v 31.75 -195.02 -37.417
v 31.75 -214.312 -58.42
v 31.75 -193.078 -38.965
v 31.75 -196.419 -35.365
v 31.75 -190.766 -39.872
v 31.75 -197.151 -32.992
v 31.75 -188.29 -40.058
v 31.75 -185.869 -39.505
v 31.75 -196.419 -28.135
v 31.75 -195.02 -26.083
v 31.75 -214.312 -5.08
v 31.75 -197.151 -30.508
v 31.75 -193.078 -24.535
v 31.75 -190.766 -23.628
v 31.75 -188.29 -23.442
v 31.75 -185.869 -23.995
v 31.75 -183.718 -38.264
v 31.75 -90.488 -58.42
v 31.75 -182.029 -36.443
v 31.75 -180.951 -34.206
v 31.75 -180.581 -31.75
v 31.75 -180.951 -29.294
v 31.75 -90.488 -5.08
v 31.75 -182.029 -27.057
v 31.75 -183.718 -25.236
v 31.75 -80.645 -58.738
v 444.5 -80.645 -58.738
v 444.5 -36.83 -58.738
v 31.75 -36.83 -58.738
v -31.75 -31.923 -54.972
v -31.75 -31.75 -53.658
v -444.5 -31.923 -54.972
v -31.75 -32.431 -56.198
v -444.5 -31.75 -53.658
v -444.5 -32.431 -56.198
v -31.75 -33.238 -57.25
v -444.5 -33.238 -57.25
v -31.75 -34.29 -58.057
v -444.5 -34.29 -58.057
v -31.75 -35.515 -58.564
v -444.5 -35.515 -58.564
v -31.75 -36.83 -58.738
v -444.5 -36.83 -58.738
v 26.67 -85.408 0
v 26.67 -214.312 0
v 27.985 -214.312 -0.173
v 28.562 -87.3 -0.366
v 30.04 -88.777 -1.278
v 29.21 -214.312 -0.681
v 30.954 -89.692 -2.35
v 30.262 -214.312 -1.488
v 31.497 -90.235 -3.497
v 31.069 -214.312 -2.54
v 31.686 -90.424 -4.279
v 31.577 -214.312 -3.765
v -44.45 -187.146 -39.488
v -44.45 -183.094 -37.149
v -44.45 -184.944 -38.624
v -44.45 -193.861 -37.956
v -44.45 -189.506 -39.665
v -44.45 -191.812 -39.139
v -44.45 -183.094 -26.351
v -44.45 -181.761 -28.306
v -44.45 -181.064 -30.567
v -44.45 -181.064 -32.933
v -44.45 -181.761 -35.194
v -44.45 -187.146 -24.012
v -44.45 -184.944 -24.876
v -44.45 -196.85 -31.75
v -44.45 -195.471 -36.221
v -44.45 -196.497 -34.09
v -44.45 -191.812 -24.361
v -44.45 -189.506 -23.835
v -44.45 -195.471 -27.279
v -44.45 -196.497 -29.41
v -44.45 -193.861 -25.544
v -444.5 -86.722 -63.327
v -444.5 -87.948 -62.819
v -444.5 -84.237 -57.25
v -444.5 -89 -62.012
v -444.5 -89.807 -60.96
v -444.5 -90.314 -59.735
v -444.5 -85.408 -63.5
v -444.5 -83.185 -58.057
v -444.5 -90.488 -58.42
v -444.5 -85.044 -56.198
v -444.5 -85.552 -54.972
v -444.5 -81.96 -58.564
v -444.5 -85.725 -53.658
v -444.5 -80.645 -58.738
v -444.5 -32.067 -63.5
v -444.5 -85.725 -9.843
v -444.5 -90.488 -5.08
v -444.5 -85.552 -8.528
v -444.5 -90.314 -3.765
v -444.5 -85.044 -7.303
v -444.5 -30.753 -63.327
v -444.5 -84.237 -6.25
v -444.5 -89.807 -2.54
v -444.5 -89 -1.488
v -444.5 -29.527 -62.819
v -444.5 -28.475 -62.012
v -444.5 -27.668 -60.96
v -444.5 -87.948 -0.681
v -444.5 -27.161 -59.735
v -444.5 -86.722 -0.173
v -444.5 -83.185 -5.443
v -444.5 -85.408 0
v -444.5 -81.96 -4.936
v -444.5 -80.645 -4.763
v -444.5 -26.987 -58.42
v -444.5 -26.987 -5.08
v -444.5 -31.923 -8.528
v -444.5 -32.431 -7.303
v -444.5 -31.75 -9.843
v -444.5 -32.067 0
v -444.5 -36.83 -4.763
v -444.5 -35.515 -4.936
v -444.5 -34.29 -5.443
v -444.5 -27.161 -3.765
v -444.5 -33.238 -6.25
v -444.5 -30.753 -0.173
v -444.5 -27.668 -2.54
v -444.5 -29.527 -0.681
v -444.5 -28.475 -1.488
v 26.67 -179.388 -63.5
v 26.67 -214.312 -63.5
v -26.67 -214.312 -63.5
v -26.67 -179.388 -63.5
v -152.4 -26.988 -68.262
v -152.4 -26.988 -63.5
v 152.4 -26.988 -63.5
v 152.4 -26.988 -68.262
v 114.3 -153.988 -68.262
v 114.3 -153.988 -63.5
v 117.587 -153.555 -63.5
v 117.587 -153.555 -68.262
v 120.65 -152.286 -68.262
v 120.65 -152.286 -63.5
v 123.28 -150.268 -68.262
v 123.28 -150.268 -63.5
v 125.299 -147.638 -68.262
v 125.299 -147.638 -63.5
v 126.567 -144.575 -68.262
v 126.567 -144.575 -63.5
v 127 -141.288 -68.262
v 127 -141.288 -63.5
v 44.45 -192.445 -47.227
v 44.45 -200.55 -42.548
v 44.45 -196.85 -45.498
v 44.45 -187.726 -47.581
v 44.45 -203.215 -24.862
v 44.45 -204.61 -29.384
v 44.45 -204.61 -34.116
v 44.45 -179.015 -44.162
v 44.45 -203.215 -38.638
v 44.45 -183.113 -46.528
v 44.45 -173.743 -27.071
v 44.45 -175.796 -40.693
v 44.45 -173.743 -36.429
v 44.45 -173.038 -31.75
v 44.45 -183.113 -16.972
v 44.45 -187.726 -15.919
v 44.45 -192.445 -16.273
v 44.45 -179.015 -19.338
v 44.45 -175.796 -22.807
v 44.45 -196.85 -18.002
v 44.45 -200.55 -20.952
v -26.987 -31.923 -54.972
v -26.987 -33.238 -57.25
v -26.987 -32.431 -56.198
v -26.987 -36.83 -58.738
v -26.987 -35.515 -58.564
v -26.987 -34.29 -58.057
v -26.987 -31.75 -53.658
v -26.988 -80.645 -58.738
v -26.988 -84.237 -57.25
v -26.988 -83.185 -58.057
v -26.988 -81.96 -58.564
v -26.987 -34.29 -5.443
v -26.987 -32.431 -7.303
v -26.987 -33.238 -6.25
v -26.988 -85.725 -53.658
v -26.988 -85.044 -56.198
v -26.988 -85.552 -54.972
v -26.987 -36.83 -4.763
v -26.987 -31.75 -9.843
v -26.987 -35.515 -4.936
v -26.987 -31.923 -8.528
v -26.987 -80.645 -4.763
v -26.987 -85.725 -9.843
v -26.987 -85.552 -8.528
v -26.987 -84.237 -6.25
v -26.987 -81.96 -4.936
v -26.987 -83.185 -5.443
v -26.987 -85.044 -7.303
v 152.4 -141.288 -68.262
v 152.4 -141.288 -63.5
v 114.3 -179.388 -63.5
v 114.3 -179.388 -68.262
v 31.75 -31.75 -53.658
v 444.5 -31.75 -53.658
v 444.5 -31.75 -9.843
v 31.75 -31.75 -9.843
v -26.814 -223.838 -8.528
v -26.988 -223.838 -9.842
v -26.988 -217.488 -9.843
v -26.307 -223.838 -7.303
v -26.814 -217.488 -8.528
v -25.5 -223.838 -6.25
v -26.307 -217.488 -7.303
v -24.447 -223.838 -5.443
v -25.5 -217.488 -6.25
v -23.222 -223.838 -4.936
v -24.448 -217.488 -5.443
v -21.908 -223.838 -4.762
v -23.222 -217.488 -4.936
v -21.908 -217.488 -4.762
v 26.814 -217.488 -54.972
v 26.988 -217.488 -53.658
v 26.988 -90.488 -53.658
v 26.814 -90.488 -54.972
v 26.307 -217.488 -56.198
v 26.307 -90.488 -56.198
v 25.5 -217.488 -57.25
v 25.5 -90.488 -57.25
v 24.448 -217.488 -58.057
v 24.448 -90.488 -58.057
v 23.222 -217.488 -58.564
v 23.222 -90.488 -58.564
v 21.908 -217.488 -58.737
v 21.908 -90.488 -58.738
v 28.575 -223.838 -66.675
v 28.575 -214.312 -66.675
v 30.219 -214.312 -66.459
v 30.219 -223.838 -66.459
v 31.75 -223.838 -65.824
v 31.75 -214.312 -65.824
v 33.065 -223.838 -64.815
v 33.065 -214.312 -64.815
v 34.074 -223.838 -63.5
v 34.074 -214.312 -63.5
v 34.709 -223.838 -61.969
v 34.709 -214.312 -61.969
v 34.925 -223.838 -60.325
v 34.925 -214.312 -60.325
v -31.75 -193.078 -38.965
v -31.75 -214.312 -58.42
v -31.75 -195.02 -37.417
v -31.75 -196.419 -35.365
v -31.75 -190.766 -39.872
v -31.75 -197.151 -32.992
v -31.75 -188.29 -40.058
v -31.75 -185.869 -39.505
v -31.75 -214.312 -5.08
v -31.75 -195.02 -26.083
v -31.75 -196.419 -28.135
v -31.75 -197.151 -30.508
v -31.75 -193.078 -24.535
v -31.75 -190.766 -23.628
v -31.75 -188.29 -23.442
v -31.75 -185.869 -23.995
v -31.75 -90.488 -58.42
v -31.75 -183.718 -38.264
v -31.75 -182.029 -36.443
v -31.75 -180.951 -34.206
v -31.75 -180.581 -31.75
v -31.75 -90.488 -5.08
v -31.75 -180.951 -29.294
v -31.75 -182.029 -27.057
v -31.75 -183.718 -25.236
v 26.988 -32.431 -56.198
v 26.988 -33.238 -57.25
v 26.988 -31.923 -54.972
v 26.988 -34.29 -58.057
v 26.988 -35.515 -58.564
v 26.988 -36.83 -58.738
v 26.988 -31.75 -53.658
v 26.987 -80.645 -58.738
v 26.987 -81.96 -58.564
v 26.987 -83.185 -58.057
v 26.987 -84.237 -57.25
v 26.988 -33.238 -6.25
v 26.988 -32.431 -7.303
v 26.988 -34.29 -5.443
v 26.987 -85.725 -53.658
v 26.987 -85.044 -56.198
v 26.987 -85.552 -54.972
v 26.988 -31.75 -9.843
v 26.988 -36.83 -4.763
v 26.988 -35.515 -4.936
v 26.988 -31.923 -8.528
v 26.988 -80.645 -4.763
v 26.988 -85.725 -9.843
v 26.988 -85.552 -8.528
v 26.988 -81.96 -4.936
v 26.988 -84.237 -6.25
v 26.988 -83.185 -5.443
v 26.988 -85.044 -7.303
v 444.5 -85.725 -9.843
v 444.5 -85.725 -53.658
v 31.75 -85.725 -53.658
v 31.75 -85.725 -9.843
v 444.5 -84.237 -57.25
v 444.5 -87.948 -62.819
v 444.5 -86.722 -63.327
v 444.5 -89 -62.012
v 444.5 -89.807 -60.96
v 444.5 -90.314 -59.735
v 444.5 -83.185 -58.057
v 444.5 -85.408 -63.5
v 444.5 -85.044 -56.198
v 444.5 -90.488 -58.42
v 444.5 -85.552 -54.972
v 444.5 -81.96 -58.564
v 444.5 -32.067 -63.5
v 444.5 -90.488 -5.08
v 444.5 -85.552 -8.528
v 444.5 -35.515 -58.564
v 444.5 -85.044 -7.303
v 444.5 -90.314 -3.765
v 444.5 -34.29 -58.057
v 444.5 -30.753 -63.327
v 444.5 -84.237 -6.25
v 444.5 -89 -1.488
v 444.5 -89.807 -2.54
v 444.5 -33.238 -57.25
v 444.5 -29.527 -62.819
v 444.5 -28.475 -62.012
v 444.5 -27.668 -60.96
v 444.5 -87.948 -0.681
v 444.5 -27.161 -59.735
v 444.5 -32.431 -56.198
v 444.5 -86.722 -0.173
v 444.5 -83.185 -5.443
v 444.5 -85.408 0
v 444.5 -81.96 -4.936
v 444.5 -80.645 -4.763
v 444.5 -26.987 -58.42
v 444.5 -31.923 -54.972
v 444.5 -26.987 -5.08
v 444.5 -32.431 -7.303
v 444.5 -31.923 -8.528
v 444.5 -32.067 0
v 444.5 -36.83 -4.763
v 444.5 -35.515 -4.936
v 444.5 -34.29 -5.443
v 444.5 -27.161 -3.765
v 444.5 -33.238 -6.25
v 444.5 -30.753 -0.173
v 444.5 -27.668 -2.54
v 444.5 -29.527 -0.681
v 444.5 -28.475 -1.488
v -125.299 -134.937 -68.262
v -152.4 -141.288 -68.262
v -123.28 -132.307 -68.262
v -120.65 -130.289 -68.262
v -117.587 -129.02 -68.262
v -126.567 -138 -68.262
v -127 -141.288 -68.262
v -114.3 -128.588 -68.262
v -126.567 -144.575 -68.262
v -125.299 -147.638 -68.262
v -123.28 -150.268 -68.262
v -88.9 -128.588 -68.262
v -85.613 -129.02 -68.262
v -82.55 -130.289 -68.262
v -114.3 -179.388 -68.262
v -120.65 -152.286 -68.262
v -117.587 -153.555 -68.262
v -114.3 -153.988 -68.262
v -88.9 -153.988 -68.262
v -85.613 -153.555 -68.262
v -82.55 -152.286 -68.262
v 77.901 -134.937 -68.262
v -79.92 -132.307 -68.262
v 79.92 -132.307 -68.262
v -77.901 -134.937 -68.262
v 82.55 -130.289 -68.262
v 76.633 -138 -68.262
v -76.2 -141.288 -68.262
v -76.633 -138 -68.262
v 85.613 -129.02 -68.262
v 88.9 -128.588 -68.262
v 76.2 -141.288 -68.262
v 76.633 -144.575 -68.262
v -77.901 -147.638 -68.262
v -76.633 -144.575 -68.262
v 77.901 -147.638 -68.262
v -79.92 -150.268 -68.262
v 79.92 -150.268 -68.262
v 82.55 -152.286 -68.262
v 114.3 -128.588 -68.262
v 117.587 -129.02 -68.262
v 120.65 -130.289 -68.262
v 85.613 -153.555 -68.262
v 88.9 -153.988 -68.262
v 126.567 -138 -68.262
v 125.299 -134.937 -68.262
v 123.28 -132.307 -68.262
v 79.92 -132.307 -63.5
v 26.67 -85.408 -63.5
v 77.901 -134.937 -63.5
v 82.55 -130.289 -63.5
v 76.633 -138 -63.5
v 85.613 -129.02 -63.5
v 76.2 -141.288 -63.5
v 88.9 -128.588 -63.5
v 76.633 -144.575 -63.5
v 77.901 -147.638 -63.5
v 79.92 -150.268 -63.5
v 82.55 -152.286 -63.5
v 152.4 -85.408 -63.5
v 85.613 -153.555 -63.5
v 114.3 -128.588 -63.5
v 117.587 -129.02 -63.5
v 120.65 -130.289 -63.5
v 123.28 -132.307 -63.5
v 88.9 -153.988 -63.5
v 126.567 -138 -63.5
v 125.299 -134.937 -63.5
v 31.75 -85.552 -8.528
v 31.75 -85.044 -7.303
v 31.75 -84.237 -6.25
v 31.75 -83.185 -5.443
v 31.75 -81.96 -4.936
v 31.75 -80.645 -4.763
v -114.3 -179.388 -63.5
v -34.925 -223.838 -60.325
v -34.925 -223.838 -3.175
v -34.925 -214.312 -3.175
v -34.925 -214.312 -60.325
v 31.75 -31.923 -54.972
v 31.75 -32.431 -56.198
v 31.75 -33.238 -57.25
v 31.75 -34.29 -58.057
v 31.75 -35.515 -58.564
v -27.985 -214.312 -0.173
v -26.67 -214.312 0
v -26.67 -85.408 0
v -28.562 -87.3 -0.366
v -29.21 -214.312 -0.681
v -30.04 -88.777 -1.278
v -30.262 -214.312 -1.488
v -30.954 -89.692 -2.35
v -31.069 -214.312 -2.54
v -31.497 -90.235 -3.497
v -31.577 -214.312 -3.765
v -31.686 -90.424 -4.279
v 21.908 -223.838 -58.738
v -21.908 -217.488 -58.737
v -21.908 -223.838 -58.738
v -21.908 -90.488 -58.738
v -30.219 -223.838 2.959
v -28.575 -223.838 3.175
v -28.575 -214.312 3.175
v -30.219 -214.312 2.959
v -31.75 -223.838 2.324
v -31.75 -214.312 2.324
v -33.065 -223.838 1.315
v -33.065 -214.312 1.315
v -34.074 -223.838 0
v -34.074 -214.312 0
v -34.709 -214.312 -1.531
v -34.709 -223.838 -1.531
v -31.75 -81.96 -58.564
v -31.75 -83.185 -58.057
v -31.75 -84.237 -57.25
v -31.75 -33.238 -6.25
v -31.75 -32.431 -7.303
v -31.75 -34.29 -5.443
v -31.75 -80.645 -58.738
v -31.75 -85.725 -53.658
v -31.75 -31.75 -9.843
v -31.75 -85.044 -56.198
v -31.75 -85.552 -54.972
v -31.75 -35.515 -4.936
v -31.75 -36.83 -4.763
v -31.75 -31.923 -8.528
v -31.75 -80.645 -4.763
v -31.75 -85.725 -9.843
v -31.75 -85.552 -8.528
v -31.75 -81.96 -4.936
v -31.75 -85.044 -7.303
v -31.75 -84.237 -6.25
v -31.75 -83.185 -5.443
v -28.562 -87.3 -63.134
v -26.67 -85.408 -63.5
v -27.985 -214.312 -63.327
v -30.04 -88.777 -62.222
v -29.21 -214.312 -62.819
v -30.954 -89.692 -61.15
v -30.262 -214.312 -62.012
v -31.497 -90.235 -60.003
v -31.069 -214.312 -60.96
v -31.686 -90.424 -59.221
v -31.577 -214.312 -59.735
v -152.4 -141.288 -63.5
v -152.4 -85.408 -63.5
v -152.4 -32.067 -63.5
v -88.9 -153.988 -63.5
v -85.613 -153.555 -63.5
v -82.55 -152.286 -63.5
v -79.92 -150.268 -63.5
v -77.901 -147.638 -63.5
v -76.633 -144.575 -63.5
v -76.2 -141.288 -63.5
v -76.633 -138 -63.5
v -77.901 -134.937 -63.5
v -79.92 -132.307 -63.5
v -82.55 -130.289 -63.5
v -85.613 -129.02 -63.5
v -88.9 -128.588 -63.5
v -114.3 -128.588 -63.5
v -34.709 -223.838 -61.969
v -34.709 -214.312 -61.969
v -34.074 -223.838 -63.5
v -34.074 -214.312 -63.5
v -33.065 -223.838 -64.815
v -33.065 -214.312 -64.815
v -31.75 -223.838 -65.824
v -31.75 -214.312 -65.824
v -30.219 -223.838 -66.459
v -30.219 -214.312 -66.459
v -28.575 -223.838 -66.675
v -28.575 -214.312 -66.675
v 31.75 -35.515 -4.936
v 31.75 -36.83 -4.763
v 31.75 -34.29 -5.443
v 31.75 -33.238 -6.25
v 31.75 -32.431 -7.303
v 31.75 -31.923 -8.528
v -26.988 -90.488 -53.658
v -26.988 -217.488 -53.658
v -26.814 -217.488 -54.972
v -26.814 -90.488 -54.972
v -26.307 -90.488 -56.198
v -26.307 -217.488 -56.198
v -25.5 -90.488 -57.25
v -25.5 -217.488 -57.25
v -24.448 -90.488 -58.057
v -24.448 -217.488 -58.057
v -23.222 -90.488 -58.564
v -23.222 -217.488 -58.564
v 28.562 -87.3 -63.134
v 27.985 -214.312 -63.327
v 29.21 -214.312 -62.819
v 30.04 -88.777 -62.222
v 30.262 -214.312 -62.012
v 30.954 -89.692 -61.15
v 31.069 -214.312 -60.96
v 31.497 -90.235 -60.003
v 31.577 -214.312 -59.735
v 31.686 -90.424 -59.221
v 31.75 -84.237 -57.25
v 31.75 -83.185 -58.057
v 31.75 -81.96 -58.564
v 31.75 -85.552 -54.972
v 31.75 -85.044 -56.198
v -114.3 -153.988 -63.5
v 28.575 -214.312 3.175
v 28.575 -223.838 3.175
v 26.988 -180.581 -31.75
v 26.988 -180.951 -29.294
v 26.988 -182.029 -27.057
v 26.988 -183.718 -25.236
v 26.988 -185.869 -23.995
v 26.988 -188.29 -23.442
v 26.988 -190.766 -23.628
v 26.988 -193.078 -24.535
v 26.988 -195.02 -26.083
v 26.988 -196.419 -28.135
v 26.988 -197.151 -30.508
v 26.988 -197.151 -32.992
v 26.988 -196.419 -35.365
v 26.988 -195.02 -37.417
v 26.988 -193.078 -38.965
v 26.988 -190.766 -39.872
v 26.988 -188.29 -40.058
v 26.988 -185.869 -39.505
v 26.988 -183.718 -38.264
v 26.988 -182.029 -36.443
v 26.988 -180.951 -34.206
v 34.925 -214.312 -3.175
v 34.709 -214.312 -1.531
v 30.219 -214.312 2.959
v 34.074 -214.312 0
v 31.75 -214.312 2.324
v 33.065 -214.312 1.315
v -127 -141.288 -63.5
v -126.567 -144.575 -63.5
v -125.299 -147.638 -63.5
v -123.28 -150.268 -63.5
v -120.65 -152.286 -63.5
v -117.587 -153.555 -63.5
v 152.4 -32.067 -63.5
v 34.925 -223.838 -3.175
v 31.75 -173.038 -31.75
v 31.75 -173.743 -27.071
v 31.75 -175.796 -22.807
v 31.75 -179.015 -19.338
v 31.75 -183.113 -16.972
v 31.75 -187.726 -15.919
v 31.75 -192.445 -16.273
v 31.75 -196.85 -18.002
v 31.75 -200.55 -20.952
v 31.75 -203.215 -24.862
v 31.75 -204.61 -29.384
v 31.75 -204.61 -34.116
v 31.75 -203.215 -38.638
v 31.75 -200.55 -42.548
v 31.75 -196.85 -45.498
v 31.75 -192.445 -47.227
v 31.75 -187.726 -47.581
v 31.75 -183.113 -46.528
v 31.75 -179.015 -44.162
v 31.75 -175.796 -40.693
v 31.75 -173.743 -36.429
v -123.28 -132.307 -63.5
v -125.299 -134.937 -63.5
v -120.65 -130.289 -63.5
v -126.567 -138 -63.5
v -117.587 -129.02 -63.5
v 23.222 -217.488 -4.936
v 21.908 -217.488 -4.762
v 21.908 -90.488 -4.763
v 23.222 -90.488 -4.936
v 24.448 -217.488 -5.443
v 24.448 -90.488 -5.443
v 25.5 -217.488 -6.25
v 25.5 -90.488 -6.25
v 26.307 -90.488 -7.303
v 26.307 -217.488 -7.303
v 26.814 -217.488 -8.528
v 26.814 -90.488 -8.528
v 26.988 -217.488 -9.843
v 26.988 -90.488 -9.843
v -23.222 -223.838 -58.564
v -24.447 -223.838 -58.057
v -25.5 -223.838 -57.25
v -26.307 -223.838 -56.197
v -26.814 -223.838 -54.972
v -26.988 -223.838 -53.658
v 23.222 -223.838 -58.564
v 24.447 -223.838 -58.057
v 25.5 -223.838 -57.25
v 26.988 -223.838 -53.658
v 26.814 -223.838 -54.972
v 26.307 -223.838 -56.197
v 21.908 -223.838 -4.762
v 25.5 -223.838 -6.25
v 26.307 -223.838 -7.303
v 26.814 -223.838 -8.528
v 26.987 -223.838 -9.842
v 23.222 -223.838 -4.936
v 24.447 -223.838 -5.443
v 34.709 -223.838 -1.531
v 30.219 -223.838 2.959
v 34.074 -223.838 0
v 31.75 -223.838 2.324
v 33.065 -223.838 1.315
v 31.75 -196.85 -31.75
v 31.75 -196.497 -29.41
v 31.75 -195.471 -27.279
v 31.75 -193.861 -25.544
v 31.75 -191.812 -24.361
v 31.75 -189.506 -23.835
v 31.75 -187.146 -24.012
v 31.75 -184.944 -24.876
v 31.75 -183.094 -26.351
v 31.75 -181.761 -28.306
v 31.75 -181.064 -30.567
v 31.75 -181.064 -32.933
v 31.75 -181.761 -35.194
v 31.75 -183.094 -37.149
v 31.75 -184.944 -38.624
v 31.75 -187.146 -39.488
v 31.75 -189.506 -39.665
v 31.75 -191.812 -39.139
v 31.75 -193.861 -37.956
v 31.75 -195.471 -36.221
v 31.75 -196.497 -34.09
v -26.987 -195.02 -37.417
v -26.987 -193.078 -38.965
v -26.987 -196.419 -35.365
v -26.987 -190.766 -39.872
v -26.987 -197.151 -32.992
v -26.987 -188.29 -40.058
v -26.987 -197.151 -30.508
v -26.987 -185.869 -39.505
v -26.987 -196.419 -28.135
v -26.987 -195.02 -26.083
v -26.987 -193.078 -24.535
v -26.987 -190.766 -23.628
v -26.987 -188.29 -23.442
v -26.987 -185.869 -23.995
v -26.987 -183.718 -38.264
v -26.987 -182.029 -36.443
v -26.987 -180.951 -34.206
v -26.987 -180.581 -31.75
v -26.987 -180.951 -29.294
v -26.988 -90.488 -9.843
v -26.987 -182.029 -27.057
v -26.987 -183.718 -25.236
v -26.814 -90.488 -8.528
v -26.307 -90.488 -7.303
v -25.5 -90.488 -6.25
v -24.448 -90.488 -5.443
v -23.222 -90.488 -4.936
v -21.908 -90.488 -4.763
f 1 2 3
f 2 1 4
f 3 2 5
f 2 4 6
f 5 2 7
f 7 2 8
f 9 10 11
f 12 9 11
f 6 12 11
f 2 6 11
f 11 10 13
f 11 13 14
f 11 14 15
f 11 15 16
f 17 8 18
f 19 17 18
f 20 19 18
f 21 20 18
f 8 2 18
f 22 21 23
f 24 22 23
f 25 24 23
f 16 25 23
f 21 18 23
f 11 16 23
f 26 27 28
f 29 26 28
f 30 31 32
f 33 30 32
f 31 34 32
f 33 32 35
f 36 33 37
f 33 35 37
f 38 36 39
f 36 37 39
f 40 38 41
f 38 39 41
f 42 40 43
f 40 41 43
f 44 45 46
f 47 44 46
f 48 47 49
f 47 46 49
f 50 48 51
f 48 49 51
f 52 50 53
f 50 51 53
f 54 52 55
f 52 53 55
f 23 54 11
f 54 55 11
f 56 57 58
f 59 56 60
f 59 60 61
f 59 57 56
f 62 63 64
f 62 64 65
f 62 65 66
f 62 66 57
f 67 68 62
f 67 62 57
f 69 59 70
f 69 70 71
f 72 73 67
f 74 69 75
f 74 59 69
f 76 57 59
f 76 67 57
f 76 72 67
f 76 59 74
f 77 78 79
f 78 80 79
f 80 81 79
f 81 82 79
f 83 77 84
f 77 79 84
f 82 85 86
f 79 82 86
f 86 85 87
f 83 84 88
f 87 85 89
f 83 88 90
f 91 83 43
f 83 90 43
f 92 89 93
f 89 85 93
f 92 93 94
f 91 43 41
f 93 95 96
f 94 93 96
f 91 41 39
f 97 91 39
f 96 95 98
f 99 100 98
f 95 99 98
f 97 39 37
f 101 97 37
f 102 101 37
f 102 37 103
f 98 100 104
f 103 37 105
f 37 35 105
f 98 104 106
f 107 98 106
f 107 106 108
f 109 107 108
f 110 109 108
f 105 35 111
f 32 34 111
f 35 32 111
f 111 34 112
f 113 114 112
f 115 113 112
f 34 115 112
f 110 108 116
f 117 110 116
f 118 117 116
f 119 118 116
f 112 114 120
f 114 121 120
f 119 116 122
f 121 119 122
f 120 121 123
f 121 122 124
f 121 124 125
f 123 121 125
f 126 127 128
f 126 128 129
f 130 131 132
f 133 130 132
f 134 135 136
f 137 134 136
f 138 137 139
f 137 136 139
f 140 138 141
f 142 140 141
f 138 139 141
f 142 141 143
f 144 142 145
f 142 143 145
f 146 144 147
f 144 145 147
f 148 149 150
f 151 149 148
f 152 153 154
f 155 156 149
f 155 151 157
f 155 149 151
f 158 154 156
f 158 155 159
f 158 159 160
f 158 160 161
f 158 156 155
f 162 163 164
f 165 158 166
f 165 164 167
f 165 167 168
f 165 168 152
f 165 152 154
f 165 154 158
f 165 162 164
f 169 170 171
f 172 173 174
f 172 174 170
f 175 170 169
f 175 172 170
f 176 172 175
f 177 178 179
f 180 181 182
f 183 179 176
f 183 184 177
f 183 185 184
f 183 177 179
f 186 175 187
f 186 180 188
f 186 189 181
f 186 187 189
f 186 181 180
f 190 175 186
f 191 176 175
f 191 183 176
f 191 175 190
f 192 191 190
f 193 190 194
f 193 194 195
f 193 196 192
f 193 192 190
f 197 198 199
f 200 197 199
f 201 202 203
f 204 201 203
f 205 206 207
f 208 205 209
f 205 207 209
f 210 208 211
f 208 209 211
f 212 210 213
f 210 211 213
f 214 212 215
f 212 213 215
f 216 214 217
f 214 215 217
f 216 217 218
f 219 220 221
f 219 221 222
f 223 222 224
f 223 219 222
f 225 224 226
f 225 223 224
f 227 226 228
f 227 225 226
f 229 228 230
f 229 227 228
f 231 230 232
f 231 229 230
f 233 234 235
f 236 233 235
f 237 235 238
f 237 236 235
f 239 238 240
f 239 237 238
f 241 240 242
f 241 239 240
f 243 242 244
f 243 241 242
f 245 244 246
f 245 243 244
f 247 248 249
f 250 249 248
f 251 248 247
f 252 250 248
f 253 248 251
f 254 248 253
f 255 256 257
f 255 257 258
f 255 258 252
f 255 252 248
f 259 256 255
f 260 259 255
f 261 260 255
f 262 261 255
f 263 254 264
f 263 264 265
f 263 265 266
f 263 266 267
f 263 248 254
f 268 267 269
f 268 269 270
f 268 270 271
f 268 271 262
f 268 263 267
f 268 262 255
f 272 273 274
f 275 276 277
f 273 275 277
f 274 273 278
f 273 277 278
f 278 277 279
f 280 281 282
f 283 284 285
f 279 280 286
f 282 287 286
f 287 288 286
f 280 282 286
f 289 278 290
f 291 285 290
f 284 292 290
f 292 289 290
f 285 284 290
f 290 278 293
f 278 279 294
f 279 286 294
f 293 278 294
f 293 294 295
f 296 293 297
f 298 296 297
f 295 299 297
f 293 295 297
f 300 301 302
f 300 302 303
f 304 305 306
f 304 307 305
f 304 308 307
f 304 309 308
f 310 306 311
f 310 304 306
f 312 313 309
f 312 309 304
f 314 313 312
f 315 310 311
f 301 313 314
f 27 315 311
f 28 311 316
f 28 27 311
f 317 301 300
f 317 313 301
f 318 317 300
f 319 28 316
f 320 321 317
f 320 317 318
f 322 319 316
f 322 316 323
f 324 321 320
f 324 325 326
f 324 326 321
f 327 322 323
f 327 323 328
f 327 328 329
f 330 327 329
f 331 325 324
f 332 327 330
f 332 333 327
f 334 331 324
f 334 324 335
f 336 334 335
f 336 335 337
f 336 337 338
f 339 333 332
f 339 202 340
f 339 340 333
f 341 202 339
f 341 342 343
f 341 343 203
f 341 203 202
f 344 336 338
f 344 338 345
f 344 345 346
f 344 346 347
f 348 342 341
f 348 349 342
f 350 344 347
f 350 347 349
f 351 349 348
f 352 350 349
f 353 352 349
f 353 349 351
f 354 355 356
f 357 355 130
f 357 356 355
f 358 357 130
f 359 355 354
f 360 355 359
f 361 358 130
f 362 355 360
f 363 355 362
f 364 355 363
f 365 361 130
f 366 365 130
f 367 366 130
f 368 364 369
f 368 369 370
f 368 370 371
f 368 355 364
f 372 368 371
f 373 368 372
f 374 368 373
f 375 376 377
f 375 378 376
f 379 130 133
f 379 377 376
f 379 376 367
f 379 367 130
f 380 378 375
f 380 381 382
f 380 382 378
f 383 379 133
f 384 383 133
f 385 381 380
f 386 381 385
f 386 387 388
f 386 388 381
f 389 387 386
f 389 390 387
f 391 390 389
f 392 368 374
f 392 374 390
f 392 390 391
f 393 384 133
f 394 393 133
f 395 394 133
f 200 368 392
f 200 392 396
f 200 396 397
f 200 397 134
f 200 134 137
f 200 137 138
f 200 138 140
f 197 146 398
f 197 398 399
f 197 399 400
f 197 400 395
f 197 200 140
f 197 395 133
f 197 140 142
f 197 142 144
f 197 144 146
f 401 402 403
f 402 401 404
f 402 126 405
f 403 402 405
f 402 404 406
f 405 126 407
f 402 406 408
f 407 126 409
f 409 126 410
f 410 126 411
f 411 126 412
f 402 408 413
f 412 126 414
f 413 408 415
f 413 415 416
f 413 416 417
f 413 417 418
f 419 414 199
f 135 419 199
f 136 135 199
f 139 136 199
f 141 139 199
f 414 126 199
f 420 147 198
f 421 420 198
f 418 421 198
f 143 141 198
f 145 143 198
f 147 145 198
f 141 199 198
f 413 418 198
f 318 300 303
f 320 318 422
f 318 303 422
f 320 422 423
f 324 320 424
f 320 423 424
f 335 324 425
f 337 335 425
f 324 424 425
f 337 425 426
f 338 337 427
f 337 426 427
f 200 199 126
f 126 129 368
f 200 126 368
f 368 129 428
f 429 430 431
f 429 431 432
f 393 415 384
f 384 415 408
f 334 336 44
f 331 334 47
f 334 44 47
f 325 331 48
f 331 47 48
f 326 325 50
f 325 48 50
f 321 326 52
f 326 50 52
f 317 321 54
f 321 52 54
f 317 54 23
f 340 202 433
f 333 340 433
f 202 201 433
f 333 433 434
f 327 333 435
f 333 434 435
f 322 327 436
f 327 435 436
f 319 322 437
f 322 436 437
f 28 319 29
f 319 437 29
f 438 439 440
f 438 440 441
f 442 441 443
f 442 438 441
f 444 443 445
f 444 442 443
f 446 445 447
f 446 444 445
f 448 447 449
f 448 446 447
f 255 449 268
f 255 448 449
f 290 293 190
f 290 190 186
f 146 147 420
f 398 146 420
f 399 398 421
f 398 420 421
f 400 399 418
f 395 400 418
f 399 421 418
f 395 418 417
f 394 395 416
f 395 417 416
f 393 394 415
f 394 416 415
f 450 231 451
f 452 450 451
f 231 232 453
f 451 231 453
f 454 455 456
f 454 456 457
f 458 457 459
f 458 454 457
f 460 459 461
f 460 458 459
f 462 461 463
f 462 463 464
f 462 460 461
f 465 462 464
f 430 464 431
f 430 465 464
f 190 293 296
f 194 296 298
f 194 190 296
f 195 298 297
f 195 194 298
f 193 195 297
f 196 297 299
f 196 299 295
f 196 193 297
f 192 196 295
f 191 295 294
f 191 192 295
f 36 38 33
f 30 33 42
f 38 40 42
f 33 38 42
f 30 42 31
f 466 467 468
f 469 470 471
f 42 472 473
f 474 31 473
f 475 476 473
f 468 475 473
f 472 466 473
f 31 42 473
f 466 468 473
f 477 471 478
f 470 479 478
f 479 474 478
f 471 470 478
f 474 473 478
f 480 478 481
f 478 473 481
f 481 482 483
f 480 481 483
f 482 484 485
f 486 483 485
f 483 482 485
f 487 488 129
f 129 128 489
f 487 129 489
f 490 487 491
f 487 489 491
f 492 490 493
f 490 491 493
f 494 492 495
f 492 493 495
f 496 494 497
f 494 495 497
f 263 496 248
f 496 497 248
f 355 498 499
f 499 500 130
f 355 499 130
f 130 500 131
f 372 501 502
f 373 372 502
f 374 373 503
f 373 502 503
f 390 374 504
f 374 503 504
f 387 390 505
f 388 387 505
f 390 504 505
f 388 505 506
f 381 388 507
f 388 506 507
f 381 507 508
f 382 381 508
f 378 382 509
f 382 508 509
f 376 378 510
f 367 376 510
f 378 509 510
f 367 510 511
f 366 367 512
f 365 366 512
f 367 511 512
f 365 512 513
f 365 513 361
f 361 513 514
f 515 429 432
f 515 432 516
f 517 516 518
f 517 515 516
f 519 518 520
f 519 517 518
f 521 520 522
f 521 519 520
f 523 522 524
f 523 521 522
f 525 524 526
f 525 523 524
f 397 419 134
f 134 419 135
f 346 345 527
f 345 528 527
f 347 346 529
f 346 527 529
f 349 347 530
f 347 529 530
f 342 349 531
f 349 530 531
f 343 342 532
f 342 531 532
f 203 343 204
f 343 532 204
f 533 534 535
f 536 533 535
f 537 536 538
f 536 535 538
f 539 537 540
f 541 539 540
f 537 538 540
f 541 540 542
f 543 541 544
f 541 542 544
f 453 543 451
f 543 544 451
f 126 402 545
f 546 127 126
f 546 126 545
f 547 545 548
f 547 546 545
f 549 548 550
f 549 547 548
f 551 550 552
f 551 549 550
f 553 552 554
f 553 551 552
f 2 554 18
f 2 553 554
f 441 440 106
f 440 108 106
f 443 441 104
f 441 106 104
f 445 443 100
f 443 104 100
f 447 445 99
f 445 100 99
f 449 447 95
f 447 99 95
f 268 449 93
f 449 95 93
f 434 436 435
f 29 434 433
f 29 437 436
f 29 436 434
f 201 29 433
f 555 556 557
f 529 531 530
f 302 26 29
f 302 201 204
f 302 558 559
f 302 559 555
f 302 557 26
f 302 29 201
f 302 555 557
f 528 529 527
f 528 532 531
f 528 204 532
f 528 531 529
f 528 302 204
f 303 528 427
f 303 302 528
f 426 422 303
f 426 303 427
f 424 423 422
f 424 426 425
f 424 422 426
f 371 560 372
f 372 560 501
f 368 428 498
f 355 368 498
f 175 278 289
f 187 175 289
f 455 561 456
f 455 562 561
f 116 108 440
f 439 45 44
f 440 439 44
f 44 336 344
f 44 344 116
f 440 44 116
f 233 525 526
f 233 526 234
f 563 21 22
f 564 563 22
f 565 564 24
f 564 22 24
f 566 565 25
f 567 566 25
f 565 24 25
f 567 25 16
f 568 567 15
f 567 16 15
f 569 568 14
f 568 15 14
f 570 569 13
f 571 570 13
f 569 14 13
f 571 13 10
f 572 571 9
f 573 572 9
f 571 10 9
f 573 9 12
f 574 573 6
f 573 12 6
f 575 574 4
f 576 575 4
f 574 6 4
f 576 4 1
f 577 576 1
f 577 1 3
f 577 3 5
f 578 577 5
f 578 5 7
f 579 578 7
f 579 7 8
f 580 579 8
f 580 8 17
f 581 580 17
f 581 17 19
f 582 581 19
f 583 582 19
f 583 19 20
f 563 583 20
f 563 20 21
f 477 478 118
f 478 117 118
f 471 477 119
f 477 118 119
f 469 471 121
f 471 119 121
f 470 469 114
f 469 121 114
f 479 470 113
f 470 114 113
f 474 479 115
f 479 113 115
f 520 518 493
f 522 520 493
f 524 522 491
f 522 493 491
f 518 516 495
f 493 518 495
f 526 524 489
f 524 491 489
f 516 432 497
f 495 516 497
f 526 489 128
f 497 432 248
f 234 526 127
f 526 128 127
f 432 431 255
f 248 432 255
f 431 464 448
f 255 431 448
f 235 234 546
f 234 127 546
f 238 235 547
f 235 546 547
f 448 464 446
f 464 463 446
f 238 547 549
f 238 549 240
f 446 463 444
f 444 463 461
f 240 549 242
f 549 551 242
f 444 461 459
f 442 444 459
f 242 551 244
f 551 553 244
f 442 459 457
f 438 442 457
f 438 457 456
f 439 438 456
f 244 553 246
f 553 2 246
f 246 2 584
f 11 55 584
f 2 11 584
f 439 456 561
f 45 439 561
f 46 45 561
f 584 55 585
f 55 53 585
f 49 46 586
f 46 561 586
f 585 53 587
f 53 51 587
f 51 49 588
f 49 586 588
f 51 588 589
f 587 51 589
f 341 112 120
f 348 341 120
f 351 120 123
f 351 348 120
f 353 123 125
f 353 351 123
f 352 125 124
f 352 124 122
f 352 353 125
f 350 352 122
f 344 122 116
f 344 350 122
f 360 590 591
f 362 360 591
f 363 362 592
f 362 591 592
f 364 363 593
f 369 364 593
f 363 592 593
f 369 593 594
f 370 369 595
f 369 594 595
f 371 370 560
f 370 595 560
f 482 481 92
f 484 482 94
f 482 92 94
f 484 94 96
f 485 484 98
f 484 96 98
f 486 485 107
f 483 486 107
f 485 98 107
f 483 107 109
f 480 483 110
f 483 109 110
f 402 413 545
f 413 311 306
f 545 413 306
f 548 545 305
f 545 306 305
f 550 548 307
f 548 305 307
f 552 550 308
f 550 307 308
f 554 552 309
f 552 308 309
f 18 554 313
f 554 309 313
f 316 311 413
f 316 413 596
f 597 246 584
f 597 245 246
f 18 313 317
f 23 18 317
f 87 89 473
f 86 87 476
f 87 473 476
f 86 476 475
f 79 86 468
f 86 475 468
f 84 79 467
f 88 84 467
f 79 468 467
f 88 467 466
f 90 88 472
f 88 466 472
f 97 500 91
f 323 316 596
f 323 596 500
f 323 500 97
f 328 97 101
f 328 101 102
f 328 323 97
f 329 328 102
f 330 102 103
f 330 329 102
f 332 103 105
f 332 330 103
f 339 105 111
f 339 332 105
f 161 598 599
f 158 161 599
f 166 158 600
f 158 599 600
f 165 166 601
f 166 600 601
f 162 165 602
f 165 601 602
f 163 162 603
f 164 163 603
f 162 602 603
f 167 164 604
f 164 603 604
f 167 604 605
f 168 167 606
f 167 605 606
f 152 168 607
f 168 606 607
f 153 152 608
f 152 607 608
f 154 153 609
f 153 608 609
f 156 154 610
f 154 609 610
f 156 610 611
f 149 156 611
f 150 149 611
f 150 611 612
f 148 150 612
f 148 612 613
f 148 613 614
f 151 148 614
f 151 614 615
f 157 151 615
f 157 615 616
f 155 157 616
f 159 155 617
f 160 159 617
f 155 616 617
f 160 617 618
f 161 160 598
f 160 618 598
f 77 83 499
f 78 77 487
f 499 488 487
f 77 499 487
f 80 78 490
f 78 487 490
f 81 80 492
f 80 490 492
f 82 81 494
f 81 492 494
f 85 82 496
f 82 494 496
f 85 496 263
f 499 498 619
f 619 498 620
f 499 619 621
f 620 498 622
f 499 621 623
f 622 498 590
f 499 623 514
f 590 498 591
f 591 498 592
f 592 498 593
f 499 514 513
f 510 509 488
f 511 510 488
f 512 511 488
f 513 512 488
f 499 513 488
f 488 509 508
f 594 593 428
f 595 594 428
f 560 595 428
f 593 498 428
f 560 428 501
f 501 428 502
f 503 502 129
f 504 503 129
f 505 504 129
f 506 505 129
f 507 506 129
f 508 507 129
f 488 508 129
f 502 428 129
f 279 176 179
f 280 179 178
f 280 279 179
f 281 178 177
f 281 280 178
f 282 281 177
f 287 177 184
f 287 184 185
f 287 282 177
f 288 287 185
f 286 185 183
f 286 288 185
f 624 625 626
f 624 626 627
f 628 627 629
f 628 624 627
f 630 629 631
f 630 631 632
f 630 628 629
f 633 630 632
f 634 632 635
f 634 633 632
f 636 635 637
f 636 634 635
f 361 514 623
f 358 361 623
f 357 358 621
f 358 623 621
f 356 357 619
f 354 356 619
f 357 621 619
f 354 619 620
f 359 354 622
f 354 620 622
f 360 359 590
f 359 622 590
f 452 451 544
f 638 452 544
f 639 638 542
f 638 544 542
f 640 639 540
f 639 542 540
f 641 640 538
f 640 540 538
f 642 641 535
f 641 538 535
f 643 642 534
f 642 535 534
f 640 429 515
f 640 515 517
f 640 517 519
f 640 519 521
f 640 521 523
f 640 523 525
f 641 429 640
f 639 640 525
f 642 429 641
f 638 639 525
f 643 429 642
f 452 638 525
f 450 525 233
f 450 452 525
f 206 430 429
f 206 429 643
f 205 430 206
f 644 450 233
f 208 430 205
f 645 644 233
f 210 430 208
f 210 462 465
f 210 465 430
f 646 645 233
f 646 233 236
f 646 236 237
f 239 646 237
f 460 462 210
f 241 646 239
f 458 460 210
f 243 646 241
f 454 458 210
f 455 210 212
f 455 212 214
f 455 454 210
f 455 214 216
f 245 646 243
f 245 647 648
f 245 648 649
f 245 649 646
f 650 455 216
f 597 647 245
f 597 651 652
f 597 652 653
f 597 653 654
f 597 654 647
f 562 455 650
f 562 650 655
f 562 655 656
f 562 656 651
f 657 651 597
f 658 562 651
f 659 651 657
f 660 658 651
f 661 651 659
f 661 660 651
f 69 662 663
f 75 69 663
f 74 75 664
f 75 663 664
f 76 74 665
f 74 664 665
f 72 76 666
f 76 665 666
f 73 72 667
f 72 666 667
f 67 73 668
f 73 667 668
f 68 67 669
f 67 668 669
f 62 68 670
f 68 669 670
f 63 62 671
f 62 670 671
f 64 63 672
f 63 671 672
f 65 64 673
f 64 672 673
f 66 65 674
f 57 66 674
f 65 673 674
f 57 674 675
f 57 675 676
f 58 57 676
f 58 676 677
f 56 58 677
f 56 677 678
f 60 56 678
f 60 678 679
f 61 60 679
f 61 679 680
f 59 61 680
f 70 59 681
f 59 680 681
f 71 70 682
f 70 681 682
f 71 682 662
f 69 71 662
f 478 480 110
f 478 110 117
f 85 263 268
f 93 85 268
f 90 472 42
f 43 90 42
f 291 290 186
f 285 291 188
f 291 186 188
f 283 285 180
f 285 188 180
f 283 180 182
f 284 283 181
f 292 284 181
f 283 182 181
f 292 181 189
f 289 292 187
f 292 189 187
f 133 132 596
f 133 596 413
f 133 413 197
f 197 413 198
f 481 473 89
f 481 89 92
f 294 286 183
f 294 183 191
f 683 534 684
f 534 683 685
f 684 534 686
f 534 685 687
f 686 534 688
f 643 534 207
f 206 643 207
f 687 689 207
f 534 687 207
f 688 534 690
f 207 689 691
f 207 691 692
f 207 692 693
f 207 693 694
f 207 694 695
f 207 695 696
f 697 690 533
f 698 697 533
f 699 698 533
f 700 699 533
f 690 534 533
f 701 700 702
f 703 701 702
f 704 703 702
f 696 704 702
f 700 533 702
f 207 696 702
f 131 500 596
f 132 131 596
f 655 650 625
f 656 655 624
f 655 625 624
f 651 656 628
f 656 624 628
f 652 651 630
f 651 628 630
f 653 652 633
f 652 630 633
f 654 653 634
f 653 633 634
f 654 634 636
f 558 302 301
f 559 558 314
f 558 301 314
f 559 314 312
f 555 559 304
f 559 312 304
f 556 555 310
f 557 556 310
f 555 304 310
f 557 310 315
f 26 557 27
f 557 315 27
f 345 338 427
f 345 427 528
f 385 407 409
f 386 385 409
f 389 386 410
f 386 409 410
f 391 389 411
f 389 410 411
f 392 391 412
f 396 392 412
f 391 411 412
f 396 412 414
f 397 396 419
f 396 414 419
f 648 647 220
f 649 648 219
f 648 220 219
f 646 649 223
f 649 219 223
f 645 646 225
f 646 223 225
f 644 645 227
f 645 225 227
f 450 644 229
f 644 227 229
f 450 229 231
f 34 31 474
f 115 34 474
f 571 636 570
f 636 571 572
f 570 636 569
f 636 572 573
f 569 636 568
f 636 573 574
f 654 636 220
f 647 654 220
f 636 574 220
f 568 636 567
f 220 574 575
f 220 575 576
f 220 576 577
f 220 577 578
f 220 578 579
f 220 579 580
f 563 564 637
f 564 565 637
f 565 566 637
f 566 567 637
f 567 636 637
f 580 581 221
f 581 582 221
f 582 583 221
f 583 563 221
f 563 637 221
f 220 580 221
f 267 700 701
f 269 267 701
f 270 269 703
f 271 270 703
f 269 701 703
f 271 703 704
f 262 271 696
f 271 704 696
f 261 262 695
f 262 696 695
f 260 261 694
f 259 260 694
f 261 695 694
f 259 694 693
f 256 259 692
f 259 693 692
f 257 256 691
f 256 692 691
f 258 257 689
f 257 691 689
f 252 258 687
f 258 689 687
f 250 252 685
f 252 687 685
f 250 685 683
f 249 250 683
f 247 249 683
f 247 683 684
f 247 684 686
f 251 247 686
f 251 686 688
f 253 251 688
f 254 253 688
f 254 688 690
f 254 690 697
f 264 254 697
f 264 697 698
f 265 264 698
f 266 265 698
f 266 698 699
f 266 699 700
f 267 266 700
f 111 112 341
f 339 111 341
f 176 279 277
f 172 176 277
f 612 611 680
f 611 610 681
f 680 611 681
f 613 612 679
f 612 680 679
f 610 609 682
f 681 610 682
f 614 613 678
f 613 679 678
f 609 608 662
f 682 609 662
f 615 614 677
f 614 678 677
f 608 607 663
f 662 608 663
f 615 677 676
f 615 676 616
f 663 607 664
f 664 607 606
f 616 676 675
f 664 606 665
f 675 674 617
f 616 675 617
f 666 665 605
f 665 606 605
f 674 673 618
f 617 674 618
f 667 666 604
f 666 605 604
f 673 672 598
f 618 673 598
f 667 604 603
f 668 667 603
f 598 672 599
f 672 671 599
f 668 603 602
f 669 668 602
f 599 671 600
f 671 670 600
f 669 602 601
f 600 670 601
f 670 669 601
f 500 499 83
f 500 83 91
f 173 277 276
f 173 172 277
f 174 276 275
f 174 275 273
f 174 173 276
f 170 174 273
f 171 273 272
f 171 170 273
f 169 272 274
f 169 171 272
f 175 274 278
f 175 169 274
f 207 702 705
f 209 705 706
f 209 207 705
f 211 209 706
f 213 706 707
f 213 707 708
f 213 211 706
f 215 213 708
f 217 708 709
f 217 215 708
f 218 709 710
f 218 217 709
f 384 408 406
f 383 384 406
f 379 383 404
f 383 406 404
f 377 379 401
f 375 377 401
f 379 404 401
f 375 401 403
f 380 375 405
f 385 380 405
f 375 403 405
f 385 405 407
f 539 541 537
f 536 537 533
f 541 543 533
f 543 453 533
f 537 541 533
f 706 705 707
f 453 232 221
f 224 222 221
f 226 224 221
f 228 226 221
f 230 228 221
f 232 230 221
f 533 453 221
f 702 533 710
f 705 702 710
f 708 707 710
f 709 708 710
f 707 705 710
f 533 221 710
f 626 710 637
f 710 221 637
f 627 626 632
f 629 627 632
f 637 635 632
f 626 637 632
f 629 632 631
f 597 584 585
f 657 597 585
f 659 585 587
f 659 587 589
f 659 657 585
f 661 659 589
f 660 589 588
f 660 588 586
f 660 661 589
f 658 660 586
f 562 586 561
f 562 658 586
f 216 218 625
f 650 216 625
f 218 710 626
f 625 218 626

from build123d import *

# Parameters (mm, degrees)
F0_W          = 63.5
F0_H          = 63.5
F0_W_2        = 53.975
F0_H_2        = 53.975
F1_DEPTH      = 444.5
F2_W          = 63.5
F2_H          = 63.5
F2_W_2        = 53.975
F2_H_2        = 53.975
F3_DEPTH      = 127
F3_DEPTH_BACK = 63.5
F4_R          = 5.08
F7_DEPTH      = 4.7625
F9_DEPTH      = 6.35
F9_DEPTH_BACK = 3.175
F11_R         = 8.3312
F12_DEPTH     = 476.251
F13_R         = 15.875
F14_DEPTH     = 12.7
F15_R         = 7.9375
F16_DEPTH     = 76.2


with BuildPart() as f1:
    # F0 (on Right) → F1 (new body, symmetric)
    with BuildSketch(Plane.YZ):
        with Locations((-58.7375, -31.75)):
            Rectangle(F0_W, F0_H)
        with Locations((-58.7375, -31.75)):
            Rectangle(F0_W_2, F0_H_2, mode=Mode.SUBTRACT)
    extrude(amount=F1_DEPTH, both=True)

    # F2 (on face) → F3 (join, two sides)
    with BuildSketch(Plane.XZ.offset(90.4875)) as f3_sk:
        with Locations((0, -31.75)):
            Rectangle(F2_W, F2_H)
        with Locations((0, -31.75)):
            Rectangle(F2_W_2, F2_H_2, mode=Mode.SUBTRACT)
    extrude(amount=F3_DEPTH)
    extrude(f3_sk.sketch, amount=-F3_DEPTH_BACK)

    # F4
    f4_edges = [f1.edges().sort_by_distance(p)[0] for p in [
        (-238.125, -90.4875, 0),
        (238.125, -90.4875, 0),
        (0, -26.9875, 0),
        (0, -26.9875, -63.5),
        (-238.125, -90.4875, -63.5),
        (238.125, -90.4875, -63.5),
        (0, -31.75, -4.7625),
        (0, -85.725, -4.7625),
        (0, -31.75, -58.7375),
        (0, -85.725, -58.7375),
        (-31.75, -153.9875, 0),
        (31.75, -153.9875, 0),
        (31.75, -153.9875, -63.5),
        (-31.75, -153.9875, -63.5),
        (-26.9875, -153.9875, -4.7625),
        (26.9875, -153.9875, -4.7625),
        (-26.9875, -153.9875, -58.7375),
        (26.9875, -153.9875, -58.7375),
        (238.125, -85.725, -58.7375),
        (238.125, -85.725, -4.7625),
        (238.125, -31.75, -58.7375),
        (238.125, -31.75, -4.7625),
        (-238.125, -85.725, -4.7625),
        (-238.125, -85.725, -58.7375),
        (-238.125, -31.75, -58.7375),
        (-238.125, -31.75, -4.7625),
    ]]
    fillet(f4_edges, radius=F4_R)

    # F6 (on face) → F7 (join)
    with BuildSketch(Plane(origin=(0, 0, -63.5), x_dir=(1, 0, 0), z_dir=(0, 0, -1))):
        Polygon((-152.4, 26.9875), (152.4, 26.9875), (152.4, 141.2875), (114.3, 179.3875), (-114.3, 179.3875), (-152.4, 141.2875), align=None)
        with BuildLine():
            ThreePointArc((-127, 141.2875), (-123.2802561211, 150.2677561211), (-114.3, 153.9875))
            Line((-114.3, 153.9875), (-88.9, 153.9875))
            ThreePointArc((-88.9, 153.9875), (-79.9197438789, 150.2677561211), (-76.2, 141.2875))
            ThreePointArc((-76.2, 141.2875), (-79.9197438789, 132.3072438789), (-88.9, 128.5875))
            Line((-88.9, 128.5875), (-114.3, 128.5875))
            ThreePointArc((-114.3, 128.5875), (-123.2802561211, 132.3072438789), (-127, 141.2875))
        make_face(mode=Mode.SUBTRACT)
        with BuildLine():
            Line((114.3, 128.5875), (88.9, 128.5875))
            ThreePointArc((88.9, 128.5875), (79.9197438789, 132.3072438789), (76.2, 141.2875))
            ThreePointArc((76.2, 141.2875), (79.9197438789, 150.2677561211), (88.9, 153.9875))
            Line((88.9, 153.9875), (114.3, 153.9875))
            ThreePointArc((114.3, 153.9875), (123.2802561211, 150.2677561211), (127, 141.2875))
            ThreePointArc((127, 141.2875), (123.2802561211, 132.3072438789), (114.3, 128.5875))
        make_face(mode=Mode.SUBTRACT)
    extrude(amount=F7_DEPTH)

    # F8 (on face) → F9 (join, two sides)
    with BuildSketch(Plane.XZ.offset(217.4875)) as f9_sk:
        with BuildLine():
            Line((28.575, 3.175), (-28.575, 3.175))
            ThreePointArc((-28.575, 3.175), (-33.0651280605, 1.3151280605), (-34.925, -3.175))
            Line((-34.925, -3.175), (-34.925, -60.325))
            ThreePointArc((-34.925, -60.325), (-33.0651280605, -64.8151280605), (-28.575, -66.675))
            Line((-28.575, -66.675), (28.575, -66.675))
            ThreePointArc((28.575, -66.675), (33.0651280605, -64.8151280605), (34.925, -60.325))
            Line((34.925, -60.325), (34.925, -3.175))
            ThreePointArc((34.925, -3.175), (33.0651280605, 1.3151280605), (28.575, 3.175))
        make_face()
        with BuildLine():
            ThreePointArc((-26.9875, -9.8425), (-25.4996024484, -6.2503975516), (-21.9075, -4.7625))
            Line((-21.9075, -4.7625), (21.9075, -4.7625))
            ThreePointArc((21.9075, -4.7625), (25.4996024484, -6.2503975516), (26.9875, -9.8425))
            Line((26.9875, -9.8425), (26.9875, -53.6575))
            ThreePointArc((26.9875, -53.6575), (25.4996024484, -57.2496024484), (21.9075, -58.7375))
            Line((21.9075, -58.7375), (-21.9075, -58.7375))
            ThreePointArc((-21.9075, -58.7375), (-25.4996024484, -57.2496024484), (-26.9875, -53.6575))
            Line((-26.9875, -53.6575), (-26.9875, -9.8425))
        make_face(mode=Mode.SUBTRACT)
    extrude(amount=F9_DEPTH)
    extrude(f9_sk.sketch, amount=-F9_DEPTH_BACK)

    # F11 (on face) → F12 (cut, through all)
    with BuildSketch(Plane.YZ.offset(31.75)):
        with Locations((-188.9125, -31.75)):
            Circle(F11_R)
    extrude(amount=-F12_DEPTH, mode=Mode.SUBTRACT)


with BuildPart() as f14:
    # F13 (on face) → F14 (new body)
    with BuildSketch(Plane.YZ.offset(31.75)):
        with Locations((-188.9125, -31.75)):
            Circle(F13_R)
    extrude(amount=F14_DEPTH)

    # F15 (on face) → F16 (join)
    with BuildSketch(Plane(origin=(31.75, 0, 0), x_dir=(0, -1, 0), z_dir=(-1, 0, 0))):
        with Locations((188.9125, -31.75)):
            Circle(F15_R)
    extrude(amount=F16_DEPTH)


solid = Compound([f1.part, f14.part])
